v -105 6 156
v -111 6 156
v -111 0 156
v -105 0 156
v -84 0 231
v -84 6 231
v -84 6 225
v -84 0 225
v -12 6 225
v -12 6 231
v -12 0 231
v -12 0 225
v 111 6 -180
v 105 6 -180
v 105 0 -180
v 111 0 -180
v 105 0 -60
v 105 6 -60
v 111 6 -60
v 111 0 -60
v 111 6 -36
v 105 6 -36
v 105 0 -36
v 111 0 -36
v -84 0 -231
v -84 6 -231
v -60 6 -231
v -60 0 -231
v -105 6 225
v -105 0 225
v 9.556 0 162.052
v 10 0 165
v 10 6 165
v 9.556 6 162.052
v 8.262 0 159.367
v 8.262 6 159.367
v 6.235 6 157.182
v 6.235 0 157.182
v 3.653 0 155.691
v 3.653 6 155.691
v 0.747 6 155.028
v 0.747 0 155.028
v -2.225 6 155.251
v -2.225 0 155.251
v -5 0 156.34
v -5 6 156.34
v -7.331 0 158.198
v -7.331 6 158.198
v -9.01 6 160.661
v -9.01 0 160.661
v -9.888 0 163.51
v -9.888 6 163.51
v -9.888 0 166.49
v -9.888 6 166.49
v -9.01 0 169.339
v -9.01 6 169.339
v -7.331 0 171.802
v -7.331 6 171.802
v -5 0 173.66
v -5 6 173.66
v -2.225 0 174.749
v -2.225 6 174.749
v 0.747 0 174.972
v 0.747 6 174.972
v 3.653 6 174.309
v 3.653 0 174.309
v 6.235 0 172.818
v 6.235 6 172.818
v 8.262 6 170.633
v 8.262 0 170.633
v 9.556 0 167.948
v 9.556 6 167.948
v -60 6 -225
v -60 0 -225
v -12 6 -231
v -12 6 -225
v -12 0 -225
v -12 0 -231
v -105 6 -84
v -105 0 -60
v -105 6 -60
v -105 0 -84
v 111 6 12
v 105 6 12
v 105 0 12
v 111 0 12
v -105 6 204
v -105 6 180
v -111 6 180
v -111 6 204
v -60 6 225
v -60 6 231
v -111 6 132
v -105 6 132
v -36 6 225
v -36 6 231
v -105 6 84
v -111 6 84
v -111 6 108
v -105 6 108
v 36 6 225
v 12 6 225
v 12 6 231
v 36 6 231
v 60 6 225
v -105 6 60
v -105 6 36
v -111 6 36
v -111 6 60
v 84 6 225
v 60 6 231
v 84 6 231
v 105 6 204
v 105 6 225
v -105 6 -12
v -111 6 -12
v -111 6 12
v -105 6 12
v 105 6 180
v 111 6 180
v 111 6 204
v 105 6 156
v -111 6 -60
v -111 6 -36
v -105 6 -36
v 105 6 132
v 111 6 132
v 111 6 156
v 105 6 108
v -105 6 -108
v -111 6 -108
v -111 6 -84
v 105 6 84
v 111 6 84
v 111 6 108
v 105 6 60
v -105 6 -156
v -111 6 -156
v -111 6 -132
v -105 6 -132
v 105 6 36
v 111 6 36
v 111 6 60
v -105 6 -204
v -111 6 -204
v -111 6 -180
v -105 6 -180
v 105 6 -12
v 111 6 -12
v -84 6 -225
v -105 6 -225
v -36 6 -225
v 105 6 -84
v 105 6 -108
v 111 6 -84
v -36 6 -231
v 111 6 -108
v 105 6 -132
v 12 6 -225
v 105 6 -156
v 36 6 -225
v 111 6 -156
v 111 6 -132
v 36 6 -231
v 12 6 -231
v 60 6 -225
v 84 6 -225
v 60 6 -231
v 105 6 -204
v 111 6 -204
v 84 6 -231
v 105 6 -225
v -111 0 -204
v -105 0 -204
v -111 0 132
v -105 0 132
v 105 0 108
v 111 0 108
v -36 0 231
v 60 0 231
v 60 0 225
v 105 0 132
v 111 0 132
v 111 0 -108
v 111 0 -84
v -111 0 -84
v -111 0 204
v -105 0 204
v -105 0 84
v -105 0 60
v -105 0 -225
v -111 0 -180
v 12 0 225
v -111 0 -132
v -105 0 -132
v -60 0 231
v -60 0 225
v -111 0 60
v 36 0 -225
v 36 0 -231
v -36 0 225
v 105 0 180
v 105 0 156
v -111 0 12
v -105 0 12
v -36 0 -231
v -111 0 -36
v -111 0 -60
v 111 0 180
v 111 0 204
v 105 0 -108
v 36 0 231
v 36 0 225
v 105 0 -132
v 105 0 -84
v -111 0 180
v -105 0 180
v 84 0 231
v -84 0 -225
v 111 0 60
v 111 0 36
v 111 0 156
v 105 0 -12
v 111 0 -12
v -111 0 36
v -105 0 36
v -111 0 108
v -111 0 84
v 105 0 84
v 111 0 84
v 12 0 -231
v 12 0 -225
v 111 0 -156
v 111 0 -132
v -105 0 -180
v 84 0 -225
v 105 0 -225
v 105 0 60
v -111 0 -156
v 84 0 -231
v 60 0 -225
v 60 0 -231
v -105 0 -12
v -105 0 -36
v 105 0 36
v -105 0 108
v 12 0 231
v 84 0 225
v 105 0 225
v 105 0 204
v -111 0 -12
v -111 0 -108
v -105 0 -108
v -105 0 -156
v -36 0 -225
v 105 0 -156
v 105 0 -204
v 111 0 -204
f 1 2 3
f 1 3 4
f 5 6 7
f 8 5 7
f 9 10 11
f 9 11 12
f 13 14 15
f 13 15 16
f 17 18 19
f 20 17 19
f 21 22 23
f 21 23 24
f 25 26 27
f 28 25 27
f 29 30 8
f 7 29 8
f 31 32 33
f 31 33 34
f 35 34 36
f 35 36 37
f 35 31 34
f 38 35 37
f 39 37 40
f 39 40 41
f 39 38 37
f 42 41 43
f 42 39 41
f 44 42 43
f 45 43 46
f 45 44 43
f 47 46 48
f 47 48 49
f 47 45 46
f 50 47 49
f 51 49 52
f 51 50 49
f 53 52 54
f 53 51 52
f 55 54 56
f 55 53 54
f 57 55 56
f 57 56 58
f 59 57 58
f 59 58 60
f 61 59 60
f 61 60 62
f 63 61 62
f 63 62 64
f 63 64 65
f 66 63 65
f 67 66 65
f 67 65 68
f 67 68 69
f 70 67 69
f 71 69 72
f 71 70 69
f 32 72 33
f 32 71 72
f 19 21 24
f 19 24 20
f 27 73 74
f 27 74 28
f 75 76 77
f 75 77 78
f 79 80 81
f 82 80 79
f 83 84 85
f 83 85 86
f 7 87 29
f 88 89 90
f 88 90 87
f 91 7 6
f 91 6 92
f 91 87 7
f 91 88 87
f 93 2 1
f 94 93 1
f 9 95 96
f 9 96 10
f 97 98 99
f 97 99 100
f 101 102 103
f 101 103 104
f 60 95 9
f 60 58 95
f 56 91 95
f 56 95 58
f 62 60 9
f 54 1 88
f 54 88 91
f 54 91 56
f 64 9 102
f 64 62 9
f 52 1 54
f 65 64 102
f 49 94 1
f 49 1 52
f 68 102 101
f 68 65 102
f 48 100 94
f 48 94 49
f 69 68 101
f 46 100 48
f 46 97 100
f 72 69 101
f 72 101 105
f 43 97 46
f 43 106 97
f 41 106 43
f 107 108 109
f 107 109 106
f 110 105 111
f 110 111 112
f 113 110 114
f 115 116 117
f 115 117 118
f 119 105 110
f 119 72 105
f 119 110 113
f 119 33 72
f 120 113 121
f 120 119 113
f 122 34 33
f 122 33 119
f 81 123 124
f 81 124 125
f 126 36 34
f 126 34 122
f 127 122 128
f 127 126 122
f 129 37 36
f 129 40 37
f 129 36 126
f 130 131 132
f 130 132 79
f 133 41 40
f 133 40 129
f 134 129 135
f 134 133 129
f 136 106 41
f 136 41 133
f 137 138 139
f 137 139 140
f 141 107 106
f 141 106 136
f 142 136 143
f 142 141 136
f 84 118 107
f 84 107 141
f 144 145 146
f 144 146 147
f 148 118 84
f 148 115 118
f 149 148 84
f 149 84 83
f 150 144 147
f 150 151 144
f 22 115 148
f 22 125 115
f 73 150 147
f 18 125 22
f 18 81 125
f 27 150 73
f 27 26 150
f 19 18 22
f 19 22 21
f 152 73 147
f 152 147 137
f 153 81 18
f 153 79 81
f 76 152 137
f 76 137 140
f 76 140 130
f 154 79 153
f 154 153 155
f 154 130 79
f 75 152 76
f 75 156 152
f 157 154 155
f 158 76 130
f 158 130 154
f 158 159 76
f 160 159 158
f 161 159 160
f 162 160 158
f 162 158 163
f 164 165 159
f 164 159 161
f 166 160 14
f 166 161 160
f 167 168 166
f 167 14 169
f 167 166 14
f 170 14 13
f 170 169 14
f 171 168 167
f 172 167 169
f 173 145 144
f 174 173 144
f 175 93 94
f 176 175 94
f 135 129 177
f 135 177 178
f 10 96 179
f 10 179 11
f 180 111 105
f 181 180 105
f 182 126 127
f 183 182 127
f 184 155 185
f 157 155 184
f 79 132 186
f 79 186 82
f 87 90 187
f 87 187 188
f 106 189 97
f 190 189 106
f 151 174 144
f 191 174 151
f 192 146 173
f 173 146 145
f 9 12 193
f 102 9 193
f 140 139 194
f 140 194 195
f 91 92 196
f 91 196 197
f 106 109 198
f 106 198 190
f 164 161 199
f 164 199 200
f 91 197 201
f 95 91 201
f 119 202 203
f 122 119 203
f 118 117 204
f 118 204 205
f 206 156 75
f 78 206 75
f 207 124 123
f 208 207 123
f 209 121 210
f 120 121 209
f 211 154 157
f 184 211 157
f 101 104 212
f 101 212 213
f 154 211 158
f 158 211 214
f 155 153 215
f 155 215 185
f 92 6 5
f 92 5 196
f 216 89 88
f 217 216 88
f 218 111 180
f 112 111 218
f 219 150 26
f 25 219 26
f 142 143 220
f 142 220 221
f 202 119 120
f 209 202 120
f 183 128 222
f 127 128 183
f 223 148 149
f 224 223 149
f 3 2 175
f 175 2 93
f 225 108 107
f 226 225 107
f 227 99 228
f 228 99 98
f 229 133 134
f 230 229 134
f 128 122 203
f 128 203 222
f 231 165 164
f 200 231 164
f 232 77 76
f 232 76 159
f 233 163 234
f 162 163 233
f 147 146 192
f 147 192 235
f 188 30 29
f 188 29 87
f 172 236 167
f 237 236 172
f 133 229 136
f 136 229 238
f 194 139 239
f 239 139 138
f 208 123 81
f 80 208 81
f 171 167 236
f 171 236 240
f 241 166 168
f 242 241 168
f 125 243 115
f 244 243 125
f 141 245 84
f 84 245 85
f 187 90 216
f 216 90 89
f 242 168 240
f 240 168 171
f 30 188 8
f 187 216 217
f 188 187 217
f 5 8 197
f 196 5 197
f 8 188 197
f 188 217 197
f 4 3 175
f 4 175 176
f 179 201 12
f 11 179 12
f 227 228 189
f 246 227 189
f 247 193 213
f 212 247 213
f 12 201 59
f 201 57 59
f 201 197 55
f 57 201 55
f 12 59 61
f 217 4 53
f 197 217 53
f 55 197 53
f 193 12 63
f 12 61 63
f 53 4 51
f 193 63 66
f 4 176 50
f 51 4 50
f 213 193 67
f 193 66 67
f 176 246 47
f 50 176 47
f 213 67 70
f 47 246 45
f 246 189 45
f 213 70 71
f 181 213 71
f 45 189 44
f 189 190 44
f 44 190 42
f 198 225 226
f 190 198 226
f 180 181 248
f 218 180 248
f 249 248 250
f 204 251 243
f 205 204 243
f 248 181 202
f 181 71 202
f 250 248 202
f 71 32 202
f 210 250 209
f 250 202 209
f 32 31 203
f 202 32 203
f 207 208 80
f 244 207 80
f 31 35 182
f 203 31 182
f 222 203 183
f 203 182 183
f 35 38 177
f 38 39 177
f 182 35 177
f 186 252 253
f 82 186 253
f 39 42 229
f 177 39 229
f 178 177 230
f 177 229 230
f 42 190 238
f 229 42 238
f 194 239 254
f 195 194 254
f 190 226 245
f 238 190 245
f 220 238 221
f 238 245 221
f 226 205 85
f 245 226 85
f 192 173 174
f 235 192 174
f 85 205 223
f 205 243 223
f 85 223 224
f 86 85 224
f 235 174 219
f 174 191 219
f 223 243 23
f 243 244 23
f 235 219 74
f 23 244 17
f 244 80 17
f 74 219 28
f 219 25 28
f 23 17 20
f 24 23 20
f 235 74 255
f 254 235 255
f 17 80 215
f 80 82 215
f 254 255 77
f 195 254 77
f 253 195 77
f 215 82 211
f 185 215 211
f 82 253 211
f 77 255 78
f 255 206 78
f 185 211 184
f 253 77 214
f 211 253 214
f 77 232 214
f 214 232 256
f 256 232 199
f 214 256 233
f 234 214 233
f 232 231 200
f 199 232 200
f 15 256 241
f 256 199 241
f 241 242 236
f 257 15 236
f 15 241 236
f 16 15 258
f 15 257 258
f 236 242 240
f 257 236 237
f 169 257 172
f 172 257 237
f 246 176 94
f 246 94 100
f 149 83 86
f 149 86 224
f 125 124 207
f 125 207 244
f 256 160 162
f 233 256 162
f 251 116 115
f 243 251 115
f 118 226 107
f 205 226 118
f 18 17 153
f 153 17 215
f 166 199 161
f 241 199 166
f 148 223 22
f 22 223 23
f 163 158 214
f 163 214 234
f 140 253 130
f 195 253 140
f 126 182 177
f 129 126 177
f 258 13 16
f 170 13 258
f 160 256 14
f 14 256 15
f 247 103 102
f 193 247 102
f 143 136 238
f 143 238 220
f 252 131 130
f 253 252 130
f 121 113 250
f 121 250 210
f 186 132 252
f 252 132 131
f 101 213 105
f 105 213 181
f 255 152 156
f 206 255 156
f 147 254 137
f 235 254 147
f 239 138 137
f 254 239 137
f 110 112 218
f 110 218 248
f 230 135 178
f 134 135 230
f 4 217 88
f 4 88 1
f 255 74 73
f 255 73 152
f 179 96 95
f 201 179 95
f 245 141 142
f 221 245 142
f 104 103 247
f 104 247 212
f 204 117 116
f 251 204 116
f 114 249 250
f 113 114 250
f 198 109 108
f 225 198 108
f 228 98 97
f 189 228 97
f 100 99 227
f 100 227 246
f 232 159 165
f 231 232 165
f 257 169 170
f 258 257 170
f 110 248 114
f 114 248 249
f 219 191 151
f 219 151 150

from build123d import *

# Parameters (mm, degrees)
SKETCH1_W           = 210
SKETCH1_H           = 450
SKETCH1_R           = 10
BOSS_EXTRUDE1_DEPTH = 6
SKETCH3_W           = 6
SKETCH3_H           = 24
BOSS_EXTRUDE3_DEPTH = 6
SKETCH2_W           = 24
SKETCH2_H           = 6
BOSS_EXTRUDE4_DEPTH = 6


with BuildPart() as part:
    # Sketch1 → Boss-Extrude1 (new body)
    with BuildSketch(Plane(origin=(0, 0, 0), x_dir=(1, 0, 0), z_dir=(0, 1, 0))):
        Rectangle(SKETCH1_W, SKETCH1_H)
        with Locations((0, -165)):
            Circle(SKETCH1_R, mode=Mode.SUBTRACT)
    extrude(amount=BOSS_EXTRUDE1_DEPTH)

    # Sketch3 → Boss-Extrude3 (add)
    with BuildSketch(Plane(origin=(0, 6, 0), x_dir=(1, 0, 0), z_dir=(0, 1, 0))):
        with Locations((-108, 192)):
            Rectangle(SKETCH3_W, SKETCH3_H)
        with Locations((108, 192)):
            Rectangle(SKETCH3_W, SKETCH3_H)
        with Locations((108, 144)):
            Rectangle(SKETCH3_W, SKETCH3_H)
        with Locations((108, 96)):
            Rectangle(SKETCH3_W, SKETCH3_H)
        with Locations((108, 48)):
            Rectangle(SKETCH3_W, SKETCH3_H)
        with Locations((108, 0)):
            Rectangle(SKETCH3_W, SKETCH3_H)
        with Locations((108, -48)):
            Rectangle(SKETCH3_W, SKETCH3_H)
        with Locations((108, -96)):
            Rectangle(SKETCH3_W, SKETCH3_H)
        with Locations((108, -144)):
            Rectangle(SKETCH3_W, SKETCH3_H)
        with Locations((108, -192)):
            Rectangle(SKETCH3_W, SKETCH3_H)
        with Locations((-108, 144)):
            Rectangle(SKETCH3_W, SKETCH3_H)
        with Locations((-108, 96)):
            Rectangle(SKETCH3_W, SKETCH3_H)
        with Locations((-108, 48)):
            Rectangle(SKETCH3_W, SKETCH3_H)
        with Locations((-108, 0)):
            Rectangle(SKETCH3_W, SKETCH3_H)
        with Locations((-108, -48)):
            Rectangle(SKETCH3_W, SKETCH3_H)
        with Locations((-108, -96)):
            Rectangle(SKETCH3_W, SKETCH3_H)
        with Locations((-108, -144)):
            Rectangle(SKETCH3_W, SKETCH3_H)
        with Locations((-108, -192)):
            Rectangle(SKETCH3_W, SKETCH3_H)
    extrude(amount=-BOSS_EXTRUDE3_DEPTH)

    # Sketch2 → Boss-Extrude4 (add)
    with BuildSketch(Plane(origin=(0, 6, 0), x_dir=(1, 0, 0), z_dir=(0, 1, 0))):
        with Locations((-72, 228)):
            Rectangle(SKETCH2_W, SKETCH2_H)
        with Locations((-24, 228)):
            Rectangle(SKETCH2_W, SKETCH2_H)
        with Locations((24, 228)):
            Rectangle(SKETCH2_W, SKETCH2_H)
        with Locations((72, 228)):
            Rectangle(SKETCH2_W, SKETCH2_H)
        with Locations((-72, -228)):
            Rectangle(SKETCH2_W, SKETCH2_H)
        with Locations((-24, -228)):
            Rectangle(SKETCH2_W, SKETCH2_H)
        with Locations((24, -228)):
            Rectangle(SKETCH2_W, SKETCH2_H)
        with Locations((72, -228)):
            Rectangle(SKETCH2_W, SKETCH2_H)
    extrude(amount=-BOSS_EXTRUDE4_DEPTH)


solid = part.part
